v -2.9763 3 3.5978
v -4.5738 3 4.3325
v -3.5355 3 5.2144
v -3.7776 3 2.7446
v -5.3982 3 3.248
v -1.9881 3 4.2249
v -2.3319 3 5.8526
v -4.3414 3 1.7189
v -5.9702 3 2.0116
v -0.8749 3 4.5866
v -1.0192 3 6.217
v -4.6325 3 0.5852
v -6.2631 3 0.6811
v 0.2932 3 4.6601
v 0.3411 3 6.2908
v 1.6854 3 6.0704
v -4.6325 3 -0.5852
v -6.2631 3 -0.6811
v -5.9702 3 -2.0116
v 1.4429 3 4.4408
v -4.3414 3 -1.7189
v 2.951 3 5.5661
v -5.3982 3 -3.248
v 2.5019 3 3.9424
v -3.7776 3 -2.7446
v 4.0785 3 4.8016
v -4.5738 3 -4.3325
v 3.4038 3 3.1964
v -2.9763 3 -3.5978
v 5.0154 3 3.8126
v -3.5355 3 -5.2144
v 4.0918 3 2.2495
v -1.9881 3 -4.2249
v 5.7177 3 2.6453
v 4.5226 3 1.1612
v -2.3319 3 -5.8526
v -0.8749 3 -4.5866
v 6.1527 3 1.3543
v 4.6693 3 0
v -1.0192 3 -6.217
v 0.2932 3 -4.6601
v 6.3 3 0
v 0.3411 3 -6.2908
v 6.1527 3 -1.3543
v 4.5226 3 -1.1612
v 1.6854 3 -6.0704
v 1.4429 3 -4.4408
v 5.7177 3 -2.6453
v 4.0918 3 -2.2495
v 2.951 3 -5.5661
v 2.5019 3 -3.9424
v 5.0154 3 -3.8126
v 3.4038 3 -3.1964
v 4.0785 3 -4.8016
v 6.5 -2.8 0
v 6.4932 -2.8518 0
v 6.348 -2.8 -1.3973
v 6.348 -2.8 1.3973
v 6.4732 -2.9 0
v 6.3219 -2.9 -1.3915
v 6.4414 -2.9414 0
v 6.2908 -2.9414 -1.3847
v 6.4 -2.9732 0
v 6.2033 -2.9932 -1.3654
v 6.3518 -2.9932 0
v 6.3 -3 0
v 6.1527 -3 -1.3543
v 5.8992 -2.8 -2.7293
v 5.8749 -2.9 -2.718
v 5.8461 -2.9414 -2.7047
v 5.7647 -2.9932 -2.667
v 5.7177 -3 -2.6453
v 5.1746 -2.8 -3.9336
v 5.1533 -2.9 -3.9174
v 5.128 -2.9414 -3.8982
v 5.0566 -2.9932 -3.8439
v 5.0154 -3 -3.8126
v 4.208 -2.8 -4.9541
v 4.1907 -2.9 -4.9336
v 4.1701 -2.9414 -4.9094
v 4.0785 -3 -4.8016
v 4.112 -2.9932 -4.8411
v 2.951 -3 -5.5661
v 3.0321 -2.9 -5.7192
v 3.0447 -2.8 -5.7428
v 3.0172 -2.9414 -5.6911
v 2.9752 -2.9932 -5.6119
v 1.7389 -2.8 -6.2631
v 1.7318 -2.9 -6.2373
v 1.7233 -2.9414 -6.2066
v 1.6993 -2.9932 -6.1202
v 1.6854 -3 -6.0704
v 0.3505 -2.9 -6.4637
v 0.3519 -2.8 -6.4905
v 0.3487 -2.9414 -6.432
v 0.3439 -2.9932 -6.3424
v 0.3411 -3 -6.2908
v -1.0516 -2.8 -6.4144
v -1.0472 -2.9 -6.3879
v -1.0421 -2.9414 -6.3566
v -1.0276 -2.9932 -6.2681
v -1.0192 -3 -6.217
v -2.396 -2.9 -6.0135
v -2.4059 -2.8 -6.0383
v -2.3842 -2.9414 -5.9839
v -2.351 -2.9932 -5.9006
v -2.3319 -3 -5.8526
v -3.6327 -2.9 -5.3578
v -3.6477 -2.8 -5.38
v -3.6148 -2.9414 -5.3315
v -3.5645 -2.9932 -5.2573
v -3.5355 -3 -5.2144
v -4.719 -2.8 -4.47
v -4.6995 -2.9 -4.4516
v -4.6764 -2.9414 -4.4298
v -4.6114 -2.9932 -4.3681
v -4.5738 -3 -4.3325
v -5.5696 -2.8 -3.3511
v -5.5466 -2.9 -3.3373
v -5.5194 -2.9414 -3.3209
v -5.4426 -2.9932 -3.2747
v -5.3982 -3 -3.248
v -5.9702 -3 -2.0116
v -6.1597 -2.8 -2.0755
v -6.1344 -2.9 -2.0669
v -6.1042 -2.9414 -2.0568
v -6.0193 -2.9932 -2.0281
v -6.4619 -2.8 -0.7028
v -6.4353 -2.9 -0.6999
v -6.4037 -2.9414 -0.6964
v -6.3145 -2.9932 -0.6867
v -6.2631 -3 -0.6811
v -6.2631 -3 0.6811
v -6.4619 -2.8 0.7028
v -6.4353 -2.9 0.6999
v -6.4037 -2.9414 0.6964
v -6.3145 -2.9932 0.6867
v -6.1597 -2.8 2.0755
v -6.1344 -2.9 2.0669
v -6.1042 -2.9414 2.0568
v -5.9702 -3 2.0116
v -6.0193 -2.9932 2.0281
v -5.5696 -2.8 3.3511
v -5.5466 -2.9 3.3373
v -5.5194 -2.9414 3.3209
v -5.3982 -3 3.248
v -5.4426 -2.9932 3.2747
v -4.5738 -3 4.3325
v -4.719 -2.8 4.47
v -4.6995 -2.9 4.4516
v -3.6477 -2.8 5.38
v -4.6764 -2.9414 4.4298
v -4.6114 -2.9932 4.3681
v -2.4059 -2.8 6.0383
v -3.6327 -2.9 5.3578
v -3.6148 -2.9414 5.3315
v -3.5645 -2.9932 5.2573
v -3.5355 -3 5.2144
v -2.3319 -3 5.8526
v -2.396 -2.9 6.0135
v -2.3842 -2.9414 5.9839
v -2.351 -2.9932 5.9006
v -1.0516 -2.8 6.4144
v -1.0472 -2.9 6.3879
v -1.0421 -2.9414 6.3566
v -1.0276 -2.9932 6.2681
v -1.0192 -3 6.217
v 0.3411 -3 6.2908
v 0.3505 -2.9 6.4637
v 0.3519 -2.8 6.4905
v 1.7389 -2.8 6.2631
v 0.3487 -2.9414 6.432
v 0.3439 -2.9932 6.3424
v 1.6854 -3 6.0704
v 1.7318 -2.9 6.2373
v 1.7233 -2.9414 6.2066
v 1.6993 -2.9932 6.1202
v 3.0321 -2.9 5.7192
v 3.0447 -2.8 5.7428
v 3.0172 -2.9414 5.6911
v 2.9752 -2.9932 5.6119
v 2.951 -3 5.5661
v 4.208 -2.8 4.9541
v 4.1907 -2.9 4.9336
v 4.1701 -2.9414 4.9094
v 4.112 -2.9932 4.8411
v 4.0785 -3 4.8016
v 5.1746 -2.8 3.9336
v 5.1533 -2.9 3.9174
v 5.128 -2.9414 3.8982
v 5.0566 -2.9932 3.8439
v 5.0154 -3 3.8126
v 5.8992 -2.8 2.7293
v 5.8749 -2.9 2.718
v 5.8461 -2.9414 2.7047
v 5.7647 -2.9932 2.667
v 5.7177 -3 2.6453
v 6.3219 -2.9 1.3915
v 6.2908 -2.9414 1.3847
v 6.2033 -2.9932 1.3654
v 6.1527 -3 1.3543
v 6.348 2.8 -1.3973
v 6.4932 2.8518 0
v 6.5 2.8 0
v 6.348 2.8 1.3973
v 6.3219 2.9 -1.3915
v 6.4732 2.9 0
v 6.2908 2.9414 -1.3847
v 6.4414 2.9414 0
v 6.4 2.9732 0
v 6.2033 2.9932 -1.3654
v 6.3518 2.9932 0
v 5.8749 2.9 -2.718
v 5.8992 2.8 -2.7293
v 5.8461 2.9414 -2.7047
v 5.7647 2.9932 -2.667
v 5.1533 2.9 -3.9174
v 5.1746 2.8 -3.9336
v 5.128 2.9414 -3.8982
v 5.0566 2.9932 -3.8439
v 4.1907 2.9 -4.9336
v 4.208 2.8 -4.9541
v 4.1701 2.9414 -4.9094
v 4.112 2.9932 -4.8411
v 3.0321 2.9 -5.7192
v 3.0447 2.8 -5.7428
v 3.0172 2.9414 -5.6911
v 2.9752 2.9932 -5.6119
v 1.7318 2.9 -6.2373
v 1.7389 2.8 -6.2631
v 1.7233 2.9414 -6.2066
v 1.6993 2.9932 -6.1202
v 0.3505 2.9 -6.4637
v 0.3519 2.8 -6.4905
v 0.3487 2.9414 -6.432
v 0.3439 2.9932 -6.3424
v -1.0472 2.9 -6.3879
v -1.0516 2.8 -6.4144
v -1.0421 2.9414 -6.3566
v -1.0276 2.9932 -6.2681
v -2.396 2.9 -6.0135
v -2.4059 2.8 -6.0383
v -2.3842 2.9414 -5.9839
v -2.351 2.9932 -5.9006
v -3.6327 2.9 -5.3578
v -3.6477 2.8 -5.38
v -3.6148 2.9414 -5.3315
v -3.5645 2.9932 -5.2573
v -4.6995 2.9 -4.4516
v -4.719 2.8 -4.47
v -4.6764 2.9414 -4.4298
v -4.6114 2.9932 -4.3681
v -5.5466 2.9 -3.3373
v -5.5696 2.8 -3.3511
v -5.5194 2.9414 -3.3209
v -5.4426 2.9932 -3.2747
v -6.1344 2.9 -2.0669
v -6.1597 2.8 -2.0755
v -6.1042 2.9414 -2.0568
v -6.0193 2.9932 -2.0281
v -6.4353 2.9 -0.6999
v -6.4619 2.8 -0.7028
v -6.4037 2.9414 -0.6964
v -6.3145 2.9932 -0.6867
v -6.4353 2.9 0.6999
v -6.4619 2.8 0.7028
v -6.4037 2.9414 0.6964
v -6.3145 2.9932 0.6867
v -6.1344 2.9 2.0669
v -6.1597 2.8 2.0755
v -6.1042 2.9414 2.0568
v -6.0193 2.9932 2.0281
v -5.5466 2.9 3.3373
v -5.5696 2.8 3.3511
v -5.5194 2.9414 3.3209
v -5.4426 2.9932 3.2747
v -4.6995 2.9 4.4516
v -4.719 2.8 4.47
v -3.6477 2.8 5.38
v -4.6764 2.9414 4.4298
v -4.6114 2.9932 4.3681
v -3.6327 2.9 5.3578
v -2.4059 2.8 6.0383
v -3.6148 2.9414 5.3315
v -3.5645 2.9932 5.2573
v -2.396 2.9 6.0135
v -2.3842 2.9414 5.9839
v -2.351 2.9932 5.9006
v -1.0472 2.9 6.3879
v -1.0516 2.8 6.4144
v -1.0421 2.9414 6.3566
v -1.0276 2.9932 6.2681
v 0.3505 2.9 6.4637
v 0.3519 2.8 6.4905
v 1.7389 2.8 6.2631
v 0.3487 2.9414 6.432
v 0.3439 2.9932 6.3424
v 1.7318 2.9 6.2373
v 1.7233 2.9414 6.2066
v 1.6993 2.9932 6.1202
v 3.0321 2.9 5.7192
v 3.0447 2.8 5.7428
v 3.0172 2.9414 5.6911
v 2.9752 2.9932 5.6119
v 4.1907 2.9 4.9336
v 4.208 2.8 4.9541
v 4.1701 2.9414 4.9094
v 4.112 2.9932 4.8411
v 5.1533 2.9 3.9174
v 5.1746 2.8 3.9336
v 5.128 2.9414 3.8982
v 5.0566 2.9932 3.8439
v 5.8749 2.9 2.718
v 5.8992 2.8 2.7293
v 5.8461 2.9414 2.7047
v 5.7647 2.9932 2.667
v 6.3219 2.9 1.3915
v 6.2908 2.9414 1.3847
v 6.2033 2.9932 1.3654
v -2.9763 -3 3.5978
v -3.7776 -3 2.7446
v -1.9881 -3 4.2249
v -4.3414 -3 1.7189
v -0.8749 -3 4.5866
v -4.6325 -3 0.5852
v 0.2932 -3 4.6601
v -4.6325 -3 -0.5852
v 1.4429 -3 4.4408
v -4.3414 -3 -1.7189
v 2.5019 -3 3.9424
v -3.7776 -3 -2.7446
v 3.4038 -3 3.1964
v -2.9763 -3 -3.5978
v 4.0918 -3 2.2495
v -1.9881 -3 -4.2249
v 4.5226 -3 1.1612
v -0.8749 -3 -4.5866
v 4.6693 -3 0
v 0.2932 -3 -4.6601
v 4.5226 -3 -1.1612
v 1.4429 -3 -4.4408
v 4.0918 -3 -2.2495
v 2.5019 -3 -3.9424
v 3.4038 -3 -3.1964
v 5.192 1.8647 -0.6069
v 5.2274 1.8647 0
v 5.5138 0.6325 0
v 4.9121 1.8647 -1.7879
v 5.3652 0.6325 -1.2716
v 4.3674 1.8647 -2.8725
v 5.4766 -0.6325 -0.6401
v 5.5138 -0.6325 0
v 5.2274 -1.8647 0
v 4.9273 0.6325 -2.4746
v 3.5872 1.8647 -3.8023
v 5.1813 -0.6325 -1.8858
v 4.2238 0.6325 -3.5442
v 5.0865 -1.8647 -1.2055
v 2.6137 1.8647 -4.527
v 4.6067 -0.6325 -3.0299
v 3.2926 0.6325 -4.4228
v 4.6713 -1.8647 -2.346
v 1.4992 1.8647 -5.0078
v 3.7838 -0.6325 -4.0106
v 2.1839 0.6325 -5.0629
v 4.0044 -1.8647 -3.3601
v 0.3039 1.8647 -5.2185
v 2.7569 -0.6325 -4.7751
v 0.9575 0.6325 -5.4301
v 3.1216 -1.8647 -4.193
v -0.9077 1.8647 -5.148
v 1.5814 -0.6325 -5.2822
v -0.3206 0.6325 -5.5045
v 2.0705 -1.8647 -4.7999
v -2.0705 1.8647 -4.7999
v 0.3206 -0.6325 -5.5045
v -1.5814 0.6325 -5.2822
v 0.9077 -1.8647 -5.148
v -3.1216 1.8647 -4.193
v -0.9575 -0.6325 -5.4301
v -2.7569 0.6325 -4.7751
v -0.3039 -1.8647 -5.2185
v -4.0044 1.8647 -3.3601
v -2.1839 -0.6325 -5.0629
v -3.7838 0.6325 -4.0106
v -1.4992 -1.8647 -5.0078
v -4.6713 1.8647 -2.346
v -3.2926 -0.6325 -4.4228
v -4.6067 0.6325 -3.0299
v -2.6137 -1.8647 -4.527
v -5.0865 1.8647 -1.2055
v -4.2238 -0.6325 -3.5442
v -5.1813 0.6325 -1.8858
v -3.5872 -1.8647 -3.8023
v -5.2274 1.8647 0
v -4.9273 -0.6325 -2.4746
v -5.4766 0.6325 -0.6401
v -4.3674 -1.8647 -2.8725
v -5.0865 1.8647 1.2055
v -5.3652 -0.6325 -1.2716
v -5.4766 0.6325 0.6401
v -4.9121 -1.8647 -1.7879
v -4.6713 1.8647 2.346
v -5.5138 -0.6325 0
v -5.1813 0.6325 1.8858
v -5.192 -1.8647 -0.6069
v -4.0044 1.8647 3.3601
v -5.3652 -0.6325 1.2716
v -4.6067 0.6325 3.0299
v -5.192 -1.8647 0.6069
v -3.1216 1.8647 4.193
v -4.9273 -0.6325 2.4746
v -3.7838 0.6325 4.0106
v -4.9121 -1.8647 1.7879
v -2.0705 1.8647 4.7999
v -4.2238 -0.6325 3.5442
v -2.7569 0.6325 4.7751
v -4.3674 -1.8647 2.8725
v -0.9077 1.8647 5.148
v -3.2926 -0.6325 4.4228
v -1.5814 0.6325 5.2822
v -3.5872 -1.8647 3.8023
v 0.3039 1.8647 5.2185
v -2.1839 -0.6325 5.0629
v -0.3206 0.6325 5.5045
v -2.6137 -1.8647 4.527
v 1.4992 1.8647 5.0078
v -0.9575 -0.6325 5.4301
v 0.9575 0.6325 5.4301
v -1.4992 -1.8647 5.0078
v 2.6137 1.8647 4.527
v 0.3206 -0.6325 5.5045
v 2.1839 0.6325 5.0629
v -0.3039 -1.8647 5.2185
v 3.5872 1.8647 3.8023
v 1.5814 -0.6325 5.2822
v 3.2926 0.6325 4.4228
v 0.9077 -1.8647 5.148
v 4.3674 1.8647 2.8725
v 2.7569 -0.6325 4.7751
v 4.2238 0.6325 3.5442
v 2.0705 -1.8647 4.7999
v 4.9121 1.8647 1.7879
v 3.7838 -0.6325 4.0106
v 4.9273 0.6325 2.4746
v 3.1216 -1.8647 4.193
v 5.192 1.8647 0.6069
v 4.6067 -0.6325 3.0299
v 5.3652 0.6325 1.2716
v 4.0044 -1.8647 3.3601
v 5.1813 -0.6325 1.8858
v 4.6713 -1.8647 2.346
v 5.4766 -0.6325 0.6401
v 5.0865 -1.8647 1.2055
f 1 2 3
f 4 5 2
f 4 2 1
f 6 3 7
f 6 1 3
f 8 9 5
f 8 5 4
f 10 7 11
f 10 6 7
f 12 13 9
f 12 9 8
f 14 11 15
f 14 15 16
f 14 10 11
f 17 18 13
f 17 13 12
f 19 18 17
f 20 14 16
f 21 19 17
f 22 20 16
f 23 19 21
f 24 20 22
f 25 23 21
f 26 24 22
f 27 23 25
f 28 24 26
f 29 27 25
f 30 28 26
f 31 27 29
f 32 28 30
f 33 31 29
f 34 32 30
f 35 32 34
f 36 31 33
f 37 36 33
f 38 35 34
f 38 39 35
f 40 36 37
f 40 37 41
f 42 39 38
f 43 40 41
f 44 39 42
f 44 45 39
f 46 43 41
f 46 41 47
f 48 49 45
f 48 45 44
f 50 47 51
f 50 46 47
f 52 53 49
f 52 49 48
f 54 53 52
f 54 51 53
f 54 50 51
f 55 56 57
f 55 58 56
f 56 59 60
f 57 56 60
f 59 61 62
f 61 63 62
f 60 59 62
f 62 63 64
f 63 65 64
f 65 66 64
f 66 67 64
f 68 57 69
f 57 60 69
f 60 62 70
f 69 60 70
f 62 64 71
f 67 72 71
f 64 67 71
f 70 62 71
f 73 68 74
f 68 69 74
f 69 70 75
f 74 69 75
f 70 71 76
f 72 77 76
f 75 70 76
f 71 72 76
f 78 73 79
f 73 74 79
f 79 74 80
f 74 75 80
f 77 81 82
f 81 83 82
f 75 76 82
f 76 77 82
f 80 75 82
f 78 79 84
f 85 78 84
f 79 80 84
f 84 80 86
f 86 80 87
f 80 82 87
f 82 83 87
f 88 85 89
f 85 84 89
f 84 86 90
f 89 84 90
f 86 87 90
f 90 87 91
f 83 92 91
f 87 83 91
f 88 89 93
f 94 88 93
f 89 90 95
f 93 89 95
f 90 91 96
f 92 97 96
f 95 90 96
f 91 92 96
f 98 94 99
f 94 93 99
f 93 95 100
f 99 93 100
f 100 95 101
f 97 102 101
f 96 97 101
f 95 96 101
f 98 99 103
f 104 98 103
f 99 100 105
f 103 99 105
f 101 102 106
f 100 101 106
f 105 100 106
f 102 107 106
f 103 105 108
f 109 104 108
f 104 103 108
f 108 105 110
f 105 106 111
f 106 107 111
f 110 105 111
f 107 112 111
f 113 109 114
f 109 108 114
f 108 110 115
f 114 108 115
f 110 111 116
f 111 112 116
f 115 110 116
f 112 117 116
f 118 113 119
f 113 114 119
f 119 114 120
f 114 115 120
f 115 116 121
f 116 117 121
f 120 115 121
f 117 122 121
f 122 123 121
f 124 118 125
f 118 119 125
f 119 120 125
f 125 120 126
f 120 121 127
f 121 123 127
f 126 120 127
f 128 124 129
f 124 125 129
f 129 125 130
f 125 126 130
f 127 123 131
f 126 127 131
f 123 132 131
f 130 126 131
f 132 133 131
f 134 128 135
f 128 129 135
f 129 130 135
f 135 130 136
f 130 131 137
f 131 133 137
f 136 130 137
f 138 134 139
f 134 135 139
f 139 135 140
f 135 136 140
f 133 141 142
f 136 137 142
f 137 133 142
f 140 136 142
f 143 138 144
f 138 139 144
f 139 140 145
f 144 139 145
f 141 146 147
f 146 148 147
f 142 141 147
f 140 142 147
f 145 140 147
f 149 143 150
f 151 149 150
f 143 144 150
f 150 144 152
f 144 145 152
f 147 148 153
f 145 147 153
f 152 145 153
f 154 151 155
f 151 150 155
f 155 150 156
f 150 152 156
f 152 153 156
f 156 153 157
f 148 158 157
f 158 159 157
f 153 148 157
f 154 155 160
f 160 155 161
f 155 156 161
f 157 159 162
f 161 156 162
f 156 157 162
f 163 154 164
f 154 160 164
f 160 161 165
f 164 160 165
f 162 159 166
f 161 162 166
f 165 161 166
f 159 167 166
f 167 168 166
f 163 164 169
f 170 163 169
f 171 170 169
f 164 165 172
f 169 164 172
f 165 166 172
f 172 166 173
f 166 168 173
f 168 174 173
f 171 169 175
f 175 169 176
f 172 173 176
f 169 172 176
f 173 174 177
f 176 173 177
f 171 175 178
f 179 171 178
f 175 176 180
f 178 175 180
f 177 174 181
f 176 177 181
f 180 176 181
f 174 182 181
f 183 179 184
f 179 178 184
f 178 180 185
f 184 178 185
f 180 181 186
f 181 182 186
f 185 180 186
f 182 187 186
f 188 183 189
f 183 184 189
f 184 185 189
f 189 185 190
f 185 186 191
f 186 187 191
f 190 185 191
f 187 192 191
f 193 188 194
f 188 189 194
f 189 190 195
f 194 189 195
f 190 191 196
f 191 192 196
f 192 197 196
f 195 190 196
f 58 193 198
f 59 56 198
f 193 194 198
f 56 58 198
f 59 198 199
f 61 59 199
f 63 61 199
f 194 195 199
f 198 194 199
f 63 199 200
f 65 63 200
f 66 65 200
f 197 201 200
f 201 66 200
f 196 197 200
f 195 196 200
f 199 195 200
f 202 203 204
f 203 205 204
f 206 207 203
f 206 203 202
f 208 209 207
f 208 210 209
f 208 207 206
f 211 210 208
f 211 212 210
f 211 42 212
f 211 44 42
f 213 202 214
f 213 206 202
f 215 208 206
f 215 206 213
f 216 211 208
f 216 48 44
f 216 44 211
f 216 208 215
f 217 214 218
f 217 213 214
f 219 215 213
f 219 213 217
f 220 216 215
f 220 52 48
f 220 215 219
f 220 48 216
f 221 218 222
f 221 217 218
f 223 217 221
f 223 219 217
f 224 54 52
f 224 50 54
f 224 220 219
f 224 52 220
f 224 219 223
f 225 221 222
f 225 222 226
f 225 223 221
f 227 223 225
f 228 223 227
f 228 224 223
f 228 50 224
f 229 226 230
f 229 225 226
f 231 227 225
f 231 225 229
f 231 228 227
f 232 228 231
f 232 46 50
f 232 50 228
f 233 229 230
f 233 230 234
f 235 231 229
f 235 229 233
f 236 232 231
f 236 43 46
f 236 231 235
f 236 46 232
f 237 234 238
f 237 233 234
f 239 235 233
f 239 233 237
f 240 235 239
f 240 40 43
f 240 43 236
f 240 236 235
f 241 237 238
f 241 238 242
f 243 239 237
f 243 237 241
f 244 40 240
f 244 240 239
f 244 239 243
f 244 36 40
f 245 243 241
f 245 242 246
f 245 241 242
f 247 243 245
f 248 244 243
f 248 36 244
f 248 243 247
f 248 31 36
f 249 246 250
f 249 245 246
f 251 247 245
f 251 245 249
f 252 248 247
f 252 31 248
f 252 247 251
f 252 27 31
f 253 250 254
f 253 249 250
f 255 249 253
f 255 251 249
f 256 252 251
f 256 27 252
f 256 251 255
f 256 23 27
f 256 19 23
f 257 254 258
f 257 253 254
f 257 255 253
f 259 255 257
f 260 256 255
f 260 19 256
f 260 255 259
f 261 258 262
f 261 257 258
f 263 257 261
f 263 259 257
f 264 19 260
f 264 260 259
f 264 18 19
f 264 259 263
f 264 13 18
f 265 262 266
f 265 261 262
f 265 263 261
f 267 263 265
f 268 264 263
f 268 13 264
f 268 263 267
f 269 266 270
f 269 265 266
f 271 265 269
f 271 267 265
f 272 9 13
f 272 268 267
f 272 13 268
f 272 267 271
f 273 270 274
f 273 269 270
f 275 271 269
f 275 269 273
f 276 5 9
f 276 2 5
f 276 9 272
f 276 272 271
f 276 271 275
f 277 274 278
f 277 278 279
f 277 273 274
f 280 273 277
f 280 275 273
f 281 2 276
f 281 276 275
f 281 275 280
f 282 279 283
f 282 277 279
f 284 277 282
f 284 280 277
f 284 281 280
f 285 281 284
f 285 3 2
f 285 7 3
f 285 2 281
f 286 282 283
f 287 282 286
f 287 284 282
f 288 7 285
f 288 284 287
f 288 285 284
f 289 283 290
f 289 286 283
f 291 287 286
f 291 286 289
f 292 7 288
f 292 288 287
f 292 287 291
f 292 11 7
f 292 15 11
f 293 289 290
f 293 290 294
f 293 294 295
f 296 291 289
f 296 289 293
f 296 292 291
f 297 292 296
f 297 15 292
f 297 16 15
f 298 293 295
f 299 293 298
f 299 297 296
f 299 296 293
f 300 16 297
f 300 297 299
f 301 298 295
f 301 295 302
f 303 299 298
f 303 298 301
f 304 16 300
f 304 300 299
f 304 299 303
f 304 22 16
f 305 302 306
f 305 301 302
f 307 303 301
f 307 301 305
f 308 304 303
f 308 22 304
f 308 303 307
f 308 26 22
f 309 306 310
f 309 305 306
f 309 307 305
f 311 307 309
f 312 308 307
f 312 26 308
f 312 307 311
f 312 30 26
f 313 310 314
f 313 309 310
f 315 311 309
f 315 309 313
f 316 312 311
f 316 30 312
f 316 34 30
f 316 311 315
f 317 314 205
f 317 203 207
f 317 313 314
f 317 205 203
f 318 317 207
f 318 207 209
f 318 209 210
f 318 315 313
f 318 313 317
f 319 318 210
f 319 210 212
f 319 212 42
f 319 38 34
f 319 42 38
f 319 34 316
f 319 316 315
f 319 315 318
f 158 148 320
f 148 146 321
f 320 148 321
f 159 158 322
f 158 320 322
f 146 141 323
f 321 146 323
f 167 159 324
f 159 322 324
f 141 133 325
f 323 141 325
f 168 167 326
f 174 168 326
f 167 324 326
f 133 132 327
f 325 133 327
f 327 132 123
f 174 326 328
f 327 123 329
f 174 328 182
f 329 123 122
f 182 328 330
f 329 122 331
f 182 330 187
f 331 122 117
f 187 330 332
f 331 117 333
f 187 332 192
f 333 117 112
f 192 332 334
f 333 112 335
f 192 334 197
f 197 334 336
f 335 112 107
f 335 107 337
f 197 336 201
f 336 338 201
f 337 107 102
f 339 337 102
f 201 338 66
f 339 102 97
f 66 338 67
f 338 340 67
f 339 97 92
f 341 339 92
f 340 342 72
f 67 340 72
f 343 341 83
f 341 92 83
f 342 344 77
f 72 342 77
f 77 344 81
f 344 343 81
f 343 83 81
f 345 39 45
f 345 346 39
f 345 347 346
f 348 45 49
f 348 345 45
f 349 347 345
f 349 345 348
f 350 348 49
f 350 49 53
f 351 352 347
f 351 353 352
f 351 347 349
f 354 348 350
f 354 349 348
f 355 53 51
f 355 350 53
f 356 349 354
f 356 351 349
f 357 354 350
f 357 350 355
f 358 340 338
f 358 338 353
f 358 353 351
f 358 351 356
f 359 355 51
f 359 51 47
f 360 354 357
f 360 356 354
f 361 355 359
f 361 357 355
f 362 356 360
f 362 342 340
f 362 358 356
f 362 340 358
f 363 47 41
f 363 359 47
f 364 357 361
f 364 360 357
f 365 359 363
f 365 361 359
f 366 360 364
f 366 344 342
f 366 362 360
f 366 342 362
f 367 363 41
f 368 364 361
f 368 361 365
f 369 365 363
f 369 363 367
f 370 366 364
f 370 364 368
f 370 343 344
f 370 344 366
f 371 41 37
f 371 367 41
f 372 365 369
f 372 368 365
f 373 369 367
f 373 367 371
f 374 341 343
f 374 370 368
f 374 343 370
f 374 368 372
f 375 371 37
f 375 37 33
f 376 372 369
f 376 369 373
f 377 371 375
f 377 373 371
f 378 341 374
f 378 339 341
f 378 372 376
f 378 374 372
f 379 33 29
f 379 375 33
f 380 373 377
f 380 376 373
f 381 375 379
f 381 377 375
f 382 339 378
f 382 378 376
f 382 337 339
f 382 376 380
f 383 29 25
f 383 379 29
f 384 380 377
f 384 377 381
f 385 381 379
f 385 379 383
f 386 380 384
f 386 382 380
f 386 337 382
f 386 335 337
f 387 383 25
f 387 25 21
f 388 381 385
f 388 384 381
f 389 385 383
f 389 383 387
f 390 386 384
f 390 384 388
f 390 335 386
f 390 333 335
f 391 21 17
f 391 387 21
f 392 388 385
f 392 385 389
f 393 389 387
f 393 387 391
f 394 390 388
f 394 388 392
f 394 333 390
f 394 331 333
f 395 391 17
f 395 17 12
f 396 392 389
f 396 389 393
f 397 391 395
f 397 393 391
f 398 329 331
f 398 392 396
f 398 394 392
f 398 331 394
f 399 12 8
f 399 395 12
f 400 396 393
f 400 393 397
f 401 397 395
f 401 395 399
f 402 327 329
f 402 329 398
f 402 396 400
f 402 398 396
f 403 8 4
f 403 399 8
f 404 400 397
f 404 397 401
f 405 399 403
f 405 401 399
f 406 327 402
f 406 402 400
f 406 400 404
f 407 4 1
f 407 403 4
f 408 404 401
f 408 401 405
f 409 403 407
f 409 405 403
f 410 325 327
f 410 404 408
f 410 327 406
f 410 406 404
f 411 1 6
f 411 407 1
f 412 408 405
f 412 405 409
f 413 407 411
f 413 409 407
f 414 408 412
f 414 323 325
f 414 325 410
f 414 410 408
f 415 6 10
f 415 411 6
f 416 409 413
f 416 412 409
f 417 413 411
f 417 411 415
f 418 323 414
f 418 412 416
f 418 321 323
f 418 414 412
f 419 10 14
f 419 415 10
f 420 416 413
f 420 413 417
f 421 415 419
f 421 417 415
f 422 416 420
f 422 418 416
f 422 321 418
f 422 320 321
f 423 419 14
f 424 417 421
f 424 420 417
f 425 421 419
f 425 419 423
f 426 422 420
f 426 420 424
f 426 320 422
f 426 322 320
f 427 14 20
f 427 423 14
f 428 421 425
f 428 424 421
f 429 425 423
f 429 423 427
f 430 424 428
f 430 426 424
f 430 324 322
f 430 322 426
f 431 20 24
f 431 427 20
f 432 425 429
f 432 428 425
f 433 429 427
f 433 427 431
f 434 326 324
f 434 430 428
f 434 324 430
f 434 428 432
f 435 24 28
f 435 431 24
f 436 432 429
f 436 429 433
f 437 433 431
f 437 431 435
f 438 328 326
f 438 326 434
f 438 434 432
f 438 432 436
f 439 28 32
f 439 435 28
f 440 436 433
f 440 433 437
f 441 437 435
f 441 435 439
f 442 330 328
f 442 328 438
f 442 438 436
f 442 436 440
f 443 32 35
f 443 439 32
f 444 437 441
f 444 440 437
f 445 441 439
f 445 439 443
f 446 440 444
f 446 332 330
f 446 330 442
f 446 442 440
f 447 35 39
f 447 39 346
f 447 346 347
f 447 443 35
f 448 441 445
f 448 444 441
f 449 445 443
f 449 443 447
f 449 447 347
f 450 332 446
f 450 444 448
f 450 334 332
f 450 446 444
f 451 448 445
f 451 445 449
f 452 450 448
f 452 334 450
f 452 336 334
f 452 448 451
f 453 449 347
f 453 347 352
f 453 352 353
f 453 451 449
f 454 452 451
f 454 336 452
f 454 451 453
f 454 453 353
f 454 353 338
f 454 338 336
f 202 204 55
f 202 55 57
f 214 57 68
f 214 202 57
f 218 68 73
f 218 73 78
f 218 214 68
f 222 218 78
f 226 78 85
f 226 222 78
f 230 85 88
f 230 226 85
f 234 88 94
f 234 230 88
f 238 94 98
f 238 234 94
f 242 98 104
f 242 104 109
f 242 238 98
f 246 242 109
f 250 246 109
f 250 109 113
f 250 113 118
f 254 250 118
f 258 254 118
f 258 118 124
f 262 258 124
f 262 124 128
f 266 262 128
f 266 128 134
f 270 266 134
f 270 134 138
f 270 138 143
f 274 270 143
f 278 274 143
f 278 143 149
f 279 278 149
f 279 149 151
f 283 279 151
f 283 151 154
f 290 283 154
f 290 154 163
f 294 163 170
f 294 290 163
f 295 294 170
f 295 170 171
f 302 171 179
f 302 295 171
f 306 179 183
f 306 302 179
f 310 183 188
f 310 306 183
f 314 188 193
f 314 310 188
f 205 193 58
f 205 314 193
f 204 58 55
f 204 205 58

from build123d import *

# Parameters (mm, degrees)
SZKIC1_R                    = 6.5
DODANIE_WYCI_GNI_CIE1_DEPTH = 3
ZAOKR_GLENIE1_R             = 0.2


with BuildPart() as part:
    # Szkic1 → Dodanie-wyciągnięcie1 (new body, symmetric)
    with BuildSketch(Plane(origin=(0, 0, 0), x_dir=(1, 0, 0), z_dir=(0, 1, 0))):
        Circle(SZKIC1_R)
    extrude(amount=DODANIE_WYCI_GNI_CIE1_DEPTH, both=True)

    # Szkic3 → Wycięcie-obrót1 (revolve, cut)
    with BuildSketch(Plane.XY):
        with BuildLine():
            Line((0, -5.55), (0, 5.55))
            ThreePointArc((0, 5.55), (5.55, 0), (0, -5.55))
        make_face()
    revolve(axis=Axis((0, -5.55, 0), (0, 1, 0)), mode=Mode.SUBTRACT)

    # Zaokrąglenie1
    zaokr_glenie1_edges = [part.edges().sort_by_distance(p)[0] for p in [
        (-6.5, -3, 0),
        (-6.5, 3, 0),
    ]]
    fillet(zaokr_glenie1_edges, radius=ZAOKR_GLENIE1_R)


solid = part.part
